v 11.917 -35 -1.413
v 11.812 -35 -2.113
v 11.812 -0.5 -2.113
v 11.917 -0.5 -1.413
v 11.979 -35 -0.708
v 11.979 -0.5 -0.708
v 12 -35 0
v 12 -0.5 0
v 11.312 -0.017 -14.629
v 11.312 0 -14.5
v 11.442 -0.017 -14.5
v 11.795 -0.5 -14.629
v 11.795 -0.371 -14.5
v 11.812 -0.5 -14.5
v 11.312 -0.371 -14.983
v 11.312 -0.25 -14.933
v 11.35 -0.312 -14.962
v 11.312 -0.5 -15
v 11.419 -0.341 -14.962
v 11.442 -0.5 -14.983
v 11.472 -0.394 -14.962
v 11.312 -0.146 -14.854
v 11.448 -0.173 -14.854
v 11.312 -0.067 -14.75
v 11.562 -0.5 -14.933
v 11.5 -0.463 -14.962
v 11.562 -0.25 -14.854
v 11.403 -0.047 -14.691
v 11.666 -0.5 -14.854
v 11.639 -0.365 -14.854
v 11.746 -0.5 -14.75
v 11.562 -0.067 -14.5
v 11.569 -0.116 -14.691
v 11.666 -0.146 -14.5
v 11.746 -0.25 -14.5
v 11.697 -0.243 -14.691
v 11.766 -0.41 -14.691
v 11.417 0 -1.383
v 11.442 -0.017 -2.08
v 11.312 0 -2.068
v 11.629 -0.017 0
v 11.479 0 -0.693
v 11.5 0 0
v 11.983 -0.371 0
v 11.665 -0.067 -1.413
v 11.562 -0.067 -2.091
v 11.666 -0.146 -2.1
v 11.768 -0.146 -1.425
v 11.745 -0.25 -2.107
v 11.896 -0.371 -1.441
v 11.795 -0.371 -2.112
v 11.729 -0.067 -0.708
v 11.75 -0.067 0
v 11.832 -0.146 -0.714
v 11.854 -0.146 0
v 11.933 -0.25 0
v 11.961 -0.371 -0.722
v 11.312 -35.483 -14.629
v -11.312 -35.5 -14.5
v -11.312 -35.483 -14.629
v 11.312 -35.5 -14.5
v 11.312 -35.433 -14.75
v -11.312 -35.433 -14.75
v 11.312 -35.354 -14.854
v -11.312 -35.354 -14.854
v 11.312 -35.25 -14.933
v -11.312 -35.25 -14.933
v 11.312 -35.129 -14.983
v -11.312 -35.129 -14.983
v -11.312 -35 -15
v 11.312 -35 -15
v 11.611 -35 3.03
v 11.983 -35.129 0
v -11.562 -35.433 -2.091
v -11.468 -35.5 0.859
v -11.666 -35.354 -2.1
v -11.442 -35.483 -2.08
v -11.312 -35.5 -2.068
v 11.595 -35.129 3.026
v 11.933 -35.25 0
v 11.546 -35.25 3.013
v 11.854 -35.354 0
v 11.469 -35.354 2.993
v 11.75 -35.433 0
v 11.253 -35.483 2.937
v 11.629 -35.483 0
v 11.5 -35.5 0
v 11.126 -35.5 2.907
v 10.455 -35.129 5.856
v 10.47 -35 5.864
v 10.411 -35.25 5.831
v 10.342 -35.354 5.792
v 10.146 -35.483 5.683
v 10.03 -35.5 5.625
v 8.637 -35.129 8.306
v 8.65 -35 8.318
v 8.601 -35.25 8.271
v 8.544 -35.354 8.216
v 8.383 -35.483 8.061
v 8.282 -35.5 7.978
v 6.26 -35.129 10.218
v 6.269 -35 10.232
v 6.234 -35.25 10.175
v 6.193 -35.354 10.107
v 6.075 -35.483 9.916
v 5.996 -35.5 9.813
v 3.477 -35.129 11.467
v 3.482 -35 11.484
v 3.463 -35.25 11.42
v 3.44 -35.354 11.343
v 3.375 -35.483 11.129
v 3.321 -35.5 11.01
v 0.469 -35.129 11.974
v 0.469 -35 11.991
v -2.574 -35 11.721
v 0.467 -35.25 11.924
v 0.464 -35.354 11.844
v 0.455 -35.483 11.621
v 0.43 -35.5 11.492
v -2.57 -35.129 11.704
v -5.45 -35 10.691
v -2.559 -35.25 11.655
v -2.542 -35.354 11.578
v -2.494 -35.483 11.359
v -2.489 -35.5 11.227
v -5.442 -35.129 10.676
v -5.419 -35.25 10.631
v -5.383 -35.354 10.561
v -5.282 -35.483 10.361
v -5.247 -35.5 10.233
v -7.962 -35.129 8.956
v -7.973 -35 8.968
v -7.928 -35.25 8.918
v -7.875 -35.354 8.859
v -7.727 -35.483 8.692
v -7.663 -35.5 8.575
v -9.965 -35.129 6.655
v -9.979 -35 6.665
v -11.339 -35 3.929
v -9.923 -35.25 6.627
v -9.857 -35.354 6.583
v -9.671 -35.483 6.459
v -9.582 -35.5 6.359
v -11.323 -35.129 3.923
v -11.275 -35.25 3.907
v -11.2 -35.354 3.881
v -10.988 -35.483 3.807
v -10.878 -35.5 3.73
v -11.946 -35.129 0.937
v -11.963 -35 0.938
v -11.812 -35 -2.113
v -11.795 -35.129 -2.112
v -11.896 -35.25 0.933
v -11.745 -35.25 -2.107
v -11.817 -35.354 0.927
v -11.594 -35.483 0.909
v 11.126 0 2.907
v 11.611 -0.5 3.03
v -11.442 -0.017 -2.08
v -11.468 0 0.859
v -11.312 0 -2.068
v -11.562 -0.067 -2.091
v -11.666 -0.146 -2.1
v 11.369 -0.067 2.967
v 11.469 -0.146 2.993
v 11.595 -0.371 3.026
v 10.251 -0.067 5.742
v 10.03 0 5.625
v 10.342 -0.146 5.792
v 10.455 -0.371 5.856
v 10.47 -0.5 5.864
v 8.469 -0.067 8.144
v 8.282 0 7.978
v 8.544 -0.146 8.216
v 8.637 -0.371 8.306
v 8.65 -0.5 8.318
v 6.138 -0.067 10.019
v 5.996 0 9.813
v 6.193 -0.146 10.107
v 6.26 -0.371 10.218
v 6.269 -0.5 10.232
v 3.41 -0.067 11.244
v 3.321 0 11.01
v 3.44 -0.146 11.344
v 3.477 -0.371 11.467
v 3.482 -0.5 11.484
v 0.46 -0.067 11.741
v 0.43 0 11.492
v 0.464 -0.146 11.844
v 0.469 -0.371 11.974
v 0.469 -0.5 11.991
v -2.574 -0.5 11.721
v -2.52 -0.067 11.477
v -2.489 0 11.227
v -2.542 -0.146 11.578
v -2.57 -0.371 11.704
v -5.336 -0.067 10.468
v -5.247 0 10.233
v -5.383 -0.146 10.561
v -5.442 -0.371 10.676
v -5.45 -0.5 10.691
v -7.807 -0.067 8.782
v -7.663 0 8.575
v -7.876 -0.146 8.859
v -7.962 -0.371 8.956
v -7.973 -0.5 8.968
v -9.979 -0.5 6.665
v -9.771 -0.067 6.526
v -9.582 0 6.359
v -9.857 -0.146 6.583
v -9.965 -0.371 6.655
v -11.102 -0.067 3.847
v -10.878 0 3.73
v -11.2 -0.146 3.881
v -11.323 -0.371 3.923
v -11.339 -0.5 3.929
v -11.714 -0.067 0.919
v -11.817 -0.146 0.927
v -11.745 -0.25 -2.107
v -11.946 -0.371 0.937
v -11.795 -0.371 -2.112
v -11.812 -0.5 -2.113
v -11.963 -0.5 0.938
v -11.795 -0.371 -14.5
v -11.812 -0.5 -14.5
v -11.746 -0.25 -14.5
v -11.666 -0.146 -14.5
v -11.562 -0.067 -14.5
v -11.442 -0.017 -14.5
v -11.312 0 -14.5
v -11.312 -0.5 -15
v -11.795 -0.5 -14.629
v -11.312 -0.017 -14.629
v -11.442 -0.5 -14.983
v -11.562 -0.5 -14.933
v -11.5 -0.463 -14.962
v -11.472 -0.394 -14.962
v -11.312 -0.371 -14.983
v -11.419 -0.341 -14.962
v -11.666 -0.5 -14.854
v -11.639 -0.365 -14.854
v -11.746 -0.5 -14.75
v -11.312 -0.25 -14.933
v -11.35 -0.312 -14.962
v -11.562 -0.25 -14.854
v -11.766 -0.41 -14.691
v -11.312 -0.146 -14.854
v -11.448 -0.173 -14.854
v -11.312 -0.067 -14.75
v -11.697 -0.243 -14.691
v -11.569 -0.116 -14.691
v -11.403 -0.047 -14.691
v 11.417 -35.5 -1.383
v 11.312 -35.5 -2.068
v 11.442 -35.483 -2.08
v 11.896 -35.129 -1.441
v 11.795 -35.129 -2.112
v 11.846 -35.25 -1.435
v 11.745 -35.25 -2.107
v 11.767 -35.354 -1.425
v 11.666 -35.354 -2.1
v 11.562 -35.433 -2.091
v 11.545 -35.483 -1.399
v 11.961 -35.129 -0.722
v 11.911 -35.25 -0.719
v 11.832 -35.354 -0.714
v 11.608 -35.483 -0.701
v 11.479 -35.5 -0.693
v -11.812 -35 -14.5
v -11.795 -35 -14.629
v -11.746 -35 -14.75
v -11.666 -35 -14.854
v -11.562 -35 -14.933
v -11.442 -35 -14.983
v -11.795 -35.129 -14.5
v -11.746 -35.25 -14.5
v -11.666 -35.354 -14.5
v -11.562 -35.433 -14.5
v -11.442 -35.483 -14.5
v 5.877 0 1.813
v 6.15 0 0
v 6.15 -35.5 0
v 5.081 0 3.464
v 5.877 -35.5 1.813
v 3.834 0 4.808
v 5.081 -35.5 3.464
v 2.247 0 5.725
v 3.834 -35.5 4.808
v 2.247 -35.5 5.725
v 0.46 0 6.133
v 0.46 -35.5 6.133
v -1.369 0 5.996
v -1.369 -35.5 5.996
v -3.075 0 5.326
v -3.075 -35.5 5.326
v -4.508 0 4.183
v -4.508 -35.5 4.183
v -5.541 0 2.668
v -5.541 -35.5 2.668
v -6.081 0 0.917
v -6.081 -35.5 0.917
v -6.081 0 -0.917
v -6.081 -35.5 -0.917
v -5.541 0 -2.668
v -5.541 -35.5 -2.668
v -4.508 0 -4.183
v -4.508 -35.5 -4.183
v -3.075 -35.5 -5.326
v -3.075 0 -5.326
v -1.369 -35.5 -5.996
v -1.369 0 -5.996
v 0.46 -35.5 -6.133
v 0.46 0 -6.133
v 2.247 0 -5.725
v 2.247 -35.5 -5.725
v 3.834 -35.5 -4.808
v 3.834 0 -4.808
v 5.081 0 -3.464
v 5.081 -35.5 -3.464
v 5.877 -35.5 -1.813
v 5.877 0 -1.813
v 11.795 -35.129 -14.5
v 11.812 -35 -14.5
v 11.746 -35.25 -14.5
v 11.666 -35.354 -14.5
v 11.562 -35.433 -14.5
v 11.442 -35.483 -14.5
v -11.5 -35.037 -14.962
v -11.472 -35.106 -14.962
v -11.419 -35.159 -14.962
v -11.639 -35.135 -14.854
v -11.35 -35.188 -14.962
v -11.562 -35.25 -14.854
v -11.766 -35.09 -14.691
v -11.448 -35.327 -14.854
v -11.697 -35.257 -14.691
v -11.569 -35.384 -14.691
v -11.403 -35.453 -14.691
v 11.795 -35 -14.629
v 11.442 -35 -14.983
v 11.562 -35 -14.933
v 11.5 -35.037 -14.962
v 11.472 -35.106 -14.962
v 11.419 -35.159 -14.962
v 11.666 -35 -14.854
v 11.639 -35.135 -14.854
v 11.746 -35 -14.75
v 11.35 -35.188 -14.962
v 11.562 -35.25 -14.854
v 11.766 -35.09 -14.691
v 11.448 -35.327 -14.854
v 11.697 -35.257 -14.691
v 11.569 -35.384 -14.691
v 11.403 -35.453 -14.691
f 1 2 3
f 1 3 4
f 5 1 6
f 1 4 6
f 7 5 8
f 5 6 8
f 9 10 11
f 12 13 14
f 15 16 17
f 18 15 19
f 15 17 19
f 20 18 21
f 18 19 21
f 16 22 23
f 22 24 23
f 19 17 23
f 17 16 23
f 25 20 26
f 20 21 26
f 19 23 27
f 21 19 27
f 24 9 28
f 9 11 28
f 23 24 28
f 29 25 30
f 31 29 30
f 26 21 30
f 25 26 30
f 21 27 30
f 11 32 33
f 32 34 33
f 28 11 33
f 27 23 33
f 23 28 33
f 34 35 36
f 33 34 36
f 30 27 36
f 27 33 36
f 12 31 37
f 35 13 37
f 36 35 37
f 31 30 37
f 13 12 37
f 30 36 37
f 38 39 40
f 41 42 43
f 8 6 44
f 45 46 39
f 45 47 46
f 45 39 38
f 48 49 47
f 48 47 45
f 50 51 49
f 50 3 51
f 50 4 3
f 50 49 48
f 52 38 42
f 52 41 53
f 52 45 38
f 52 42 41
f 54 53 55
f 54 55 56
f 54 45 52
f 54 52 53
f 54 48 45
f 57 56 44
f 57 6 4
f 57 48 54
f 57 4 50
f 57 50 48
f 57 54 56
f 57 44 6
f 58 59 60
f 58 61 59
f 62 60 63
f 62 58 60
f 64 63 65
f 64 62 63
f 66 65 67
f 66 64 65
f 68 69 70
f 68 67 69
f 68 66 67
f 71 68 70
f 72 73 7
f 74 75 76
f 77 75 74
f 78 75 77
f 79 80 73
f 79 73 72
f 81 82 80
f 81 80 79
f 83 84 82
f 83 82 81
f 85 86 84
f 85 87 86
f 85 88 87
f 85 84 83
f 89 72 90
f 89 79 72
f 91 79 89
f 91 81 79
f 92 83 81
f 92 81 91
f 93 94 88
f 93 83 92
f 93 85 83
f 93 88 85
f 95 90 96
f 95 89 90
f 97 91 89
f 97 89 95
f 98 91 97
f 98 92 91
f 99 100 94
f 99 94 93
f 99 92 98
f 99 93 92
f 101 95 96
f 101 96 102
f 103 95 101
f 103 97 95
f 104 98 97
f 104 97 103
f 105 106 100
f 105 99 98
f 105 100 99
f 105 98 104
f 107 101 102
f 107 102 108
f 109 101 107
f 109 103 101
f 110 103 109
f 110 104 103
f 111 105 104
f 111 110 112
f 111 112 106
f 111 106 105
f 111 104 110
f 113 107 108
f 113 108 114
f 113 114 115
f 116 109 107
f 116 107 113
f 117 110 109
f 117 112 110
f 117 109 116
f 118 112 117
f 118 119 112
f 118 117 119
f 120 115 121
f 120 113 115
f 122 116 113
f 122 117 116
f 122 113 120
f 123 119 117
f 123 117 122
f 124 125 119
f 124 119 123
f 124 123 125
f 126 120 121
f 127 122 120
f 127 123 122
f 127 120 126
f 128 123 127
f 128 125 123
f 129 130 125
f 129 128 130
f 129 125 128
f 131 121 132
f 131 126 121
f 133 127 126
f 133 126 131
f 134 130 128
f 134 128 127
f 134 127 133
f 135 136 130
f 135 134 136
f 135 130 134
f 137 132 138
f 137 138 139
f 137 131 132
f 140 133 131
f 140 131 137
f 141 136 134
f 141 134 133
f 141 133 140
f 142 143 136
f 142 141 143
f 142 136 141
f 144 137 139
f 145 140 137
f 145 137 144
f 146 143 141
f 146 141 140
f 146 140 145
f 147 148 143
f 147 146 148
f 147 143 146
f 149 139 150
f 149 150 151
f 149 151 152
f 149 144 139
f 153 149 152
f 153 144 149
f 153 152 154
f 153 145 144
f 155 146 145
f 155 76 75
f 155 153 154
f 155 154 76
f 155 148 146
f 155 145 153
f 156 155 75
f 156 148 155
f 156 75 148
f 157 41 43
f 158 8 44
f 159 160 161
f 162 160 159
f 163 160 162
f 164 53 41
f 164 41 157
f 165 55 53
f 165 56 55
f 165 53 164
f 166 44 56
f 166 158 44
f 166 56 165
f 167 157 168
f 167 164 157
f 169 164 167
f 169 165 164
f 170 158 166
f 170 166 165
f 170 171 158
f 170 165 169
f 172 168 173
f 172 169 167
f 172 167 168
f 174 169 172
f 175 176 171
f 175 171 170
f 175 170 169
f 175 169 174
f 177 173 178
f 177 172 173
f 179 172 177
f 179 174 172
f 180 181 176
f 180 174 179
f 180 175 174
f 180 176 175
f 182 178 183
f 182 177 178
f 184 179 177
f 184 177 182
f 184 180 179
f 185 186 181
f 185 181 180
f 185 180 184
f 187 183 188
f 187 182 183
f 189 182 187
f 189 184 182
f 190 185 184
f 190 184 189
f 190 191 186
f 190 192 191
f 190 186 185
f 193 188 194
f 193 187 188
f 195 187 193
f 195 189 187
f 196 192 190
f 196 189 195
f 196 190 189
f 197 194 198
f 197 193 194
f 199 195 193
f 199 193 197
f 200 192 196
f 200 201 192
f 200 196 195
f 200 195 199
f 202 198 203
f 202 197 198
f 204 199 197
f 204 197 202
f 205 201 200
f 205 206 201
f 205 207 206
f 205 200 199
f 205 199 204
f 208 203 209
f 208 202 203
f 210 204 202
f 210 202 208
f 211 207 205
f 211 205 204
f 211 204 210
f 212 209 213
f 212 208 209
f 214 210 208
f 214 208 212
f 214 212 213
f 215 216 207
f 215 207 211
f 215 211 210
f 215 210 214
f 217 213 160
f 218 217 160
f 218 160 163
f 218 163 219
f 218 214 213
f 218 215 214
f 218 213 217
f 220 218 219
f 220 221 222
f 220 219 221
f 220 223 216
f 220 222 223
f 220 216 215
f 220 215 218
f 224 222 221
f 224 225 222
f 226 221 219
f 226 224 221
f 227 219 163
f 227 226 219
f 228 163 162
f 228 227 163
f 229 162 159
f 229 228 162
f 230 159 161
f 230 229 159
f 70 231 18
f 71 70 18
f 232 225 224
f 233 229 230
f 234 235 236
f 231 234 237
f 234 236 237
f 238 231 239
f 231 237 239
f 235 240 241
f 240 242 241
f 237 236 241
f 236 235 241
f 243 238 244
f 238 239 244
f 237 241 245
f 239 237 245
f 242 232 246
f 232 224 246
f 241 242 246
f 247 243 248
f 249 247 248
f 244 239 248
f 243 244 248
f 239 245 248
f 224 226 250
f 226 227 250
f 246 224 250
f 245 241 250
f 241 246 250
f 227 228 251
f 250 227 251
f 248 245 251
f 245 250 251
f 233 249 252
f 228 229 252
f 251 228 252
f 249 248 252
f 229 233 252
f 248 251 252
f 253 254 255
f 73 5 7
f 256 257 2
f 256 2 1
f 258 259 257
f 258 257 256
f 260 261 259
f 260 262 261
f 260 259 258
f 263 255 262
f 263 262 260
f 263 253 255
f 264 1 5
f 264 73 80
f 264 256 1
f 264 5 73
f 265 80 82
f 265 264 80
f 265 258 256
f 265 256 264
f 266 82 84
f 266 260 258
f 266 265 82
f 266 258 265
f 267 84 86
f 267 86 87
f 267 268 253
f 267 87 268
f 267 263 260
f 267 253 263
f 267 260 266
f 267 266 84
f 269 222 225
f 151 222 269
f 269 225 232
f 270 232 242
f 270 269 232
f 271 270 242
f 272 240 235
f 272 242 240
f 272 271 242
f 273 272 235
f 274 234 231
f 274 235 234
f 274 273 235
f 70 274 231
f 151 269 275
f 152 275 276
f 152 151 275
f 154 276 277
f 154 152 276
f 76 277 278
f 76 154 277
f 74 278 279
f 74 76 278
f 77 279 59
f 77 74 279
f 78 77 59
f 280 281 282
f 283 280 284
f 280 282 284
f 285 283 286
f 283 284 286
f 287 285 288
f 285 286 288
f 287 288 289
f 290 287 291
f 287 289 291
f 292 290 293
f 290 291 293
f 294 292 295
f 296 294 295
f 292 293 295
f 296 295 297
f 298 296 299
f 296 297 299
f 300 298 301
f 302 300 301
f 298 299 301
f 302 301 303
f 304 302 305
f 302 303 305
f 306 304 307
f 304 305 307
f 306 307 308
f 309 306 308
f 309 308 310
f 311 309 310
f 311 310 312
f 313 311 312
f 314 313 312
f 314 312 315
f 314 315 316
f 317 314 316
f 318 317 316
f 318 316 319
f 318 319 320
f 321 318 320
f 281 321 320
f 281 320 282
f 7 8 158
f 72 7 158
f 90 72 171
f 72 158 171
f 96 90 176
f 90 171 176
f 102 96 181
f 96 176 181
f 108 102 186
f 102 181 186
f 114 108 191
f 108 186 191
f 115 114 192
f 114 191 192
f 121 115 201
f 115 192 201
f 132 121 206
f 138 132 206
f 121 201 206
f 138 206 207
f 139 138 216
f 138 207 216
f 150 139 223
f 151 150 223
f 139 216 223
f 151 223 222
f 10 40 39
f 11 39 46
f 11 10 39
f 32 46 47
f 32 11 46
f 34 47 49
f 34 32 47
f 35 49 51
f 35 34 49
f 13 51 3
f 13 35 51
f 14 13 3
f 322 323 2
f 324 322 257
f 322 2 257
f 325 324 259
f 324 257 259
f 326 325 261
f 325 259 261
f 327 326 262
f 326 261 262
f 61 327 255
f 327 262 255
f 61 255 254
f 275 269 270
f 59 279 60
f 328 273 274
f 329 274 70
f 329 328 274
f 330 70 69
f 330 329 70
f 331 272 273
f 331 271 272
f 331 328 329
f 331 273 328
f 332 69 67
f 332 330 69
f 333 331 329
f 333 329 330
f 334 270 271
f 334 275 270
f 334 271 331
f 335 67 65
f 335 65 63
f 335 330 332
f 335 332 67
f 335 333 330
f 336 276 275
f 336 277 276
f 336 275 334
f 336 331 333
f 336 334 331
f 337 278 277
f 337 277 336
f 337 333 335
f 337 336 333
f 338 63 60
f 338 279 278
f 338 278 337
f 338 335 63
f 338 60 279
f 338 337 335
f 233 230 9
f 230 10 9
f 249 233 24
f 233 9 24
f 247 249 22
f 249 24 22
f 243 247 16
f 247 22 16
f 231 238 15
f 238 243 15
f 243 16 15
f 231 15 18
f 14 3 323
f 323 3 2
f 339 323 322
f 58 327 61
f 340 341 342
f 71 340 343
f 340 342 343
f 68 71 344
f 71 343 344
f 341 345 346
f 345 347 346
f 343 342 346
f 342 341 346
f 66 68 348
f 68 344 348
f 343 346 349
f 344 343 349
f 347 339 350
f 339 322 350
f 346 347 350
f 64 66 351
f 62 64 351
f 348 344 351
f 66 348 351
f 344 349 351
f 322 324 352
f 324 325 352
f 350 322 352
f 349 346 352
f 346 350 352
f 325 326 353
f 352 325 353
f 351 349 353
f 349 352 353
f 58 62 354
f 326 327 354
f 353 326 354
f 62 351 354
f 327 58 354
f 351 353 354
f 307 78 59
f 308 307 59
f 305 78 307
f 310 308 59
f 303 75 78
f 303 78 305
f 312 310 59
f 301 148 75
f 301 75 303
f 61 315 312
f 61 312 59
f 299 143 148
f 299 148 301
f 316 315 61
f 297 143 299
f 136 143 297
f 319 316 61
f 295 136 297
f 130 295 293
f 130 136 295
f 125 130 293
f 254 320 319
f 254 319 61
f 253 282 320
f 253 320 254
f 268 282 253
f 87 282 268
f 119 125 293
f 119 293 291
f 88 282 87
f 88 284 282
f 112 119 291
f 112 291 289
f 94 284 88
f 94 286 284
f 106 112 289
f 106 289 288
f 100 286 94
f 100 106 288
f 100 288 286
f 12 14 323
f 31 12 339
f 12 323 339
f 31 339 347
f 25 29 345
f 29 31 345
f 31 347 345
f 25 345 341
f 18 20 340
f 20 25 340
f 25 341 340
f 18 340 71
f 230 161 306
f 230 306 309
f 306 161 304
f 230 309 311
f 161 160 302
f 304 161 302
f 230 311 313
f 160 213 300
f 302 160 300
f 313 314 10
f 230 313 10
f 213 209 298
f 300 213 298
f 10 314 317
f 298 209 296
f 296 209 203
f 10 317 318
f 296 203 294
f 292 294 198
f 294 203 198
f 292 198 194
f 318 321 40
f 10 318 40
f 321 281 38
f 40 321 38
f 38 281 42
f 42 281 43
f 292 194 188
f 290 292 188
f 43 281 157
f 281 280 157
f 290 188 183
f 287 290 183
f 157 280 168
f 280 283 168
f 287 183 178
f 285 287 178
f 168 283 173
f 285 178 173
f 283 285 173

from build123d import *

# Parameters (mm, degrees)
F1_R     = 6.15
F2_DEPTH = 35.5
F3_DEPTH = 35.501
F4_DEPTH = 2
F5_R     = 0.5


# Not quite as in the source:
# - two fillets or chamfers of one size are made in one step


with BuildPart() as f2:
    # F1 (on face) → F2 (new body)
    with BuildSketch(Plane.XZ):
        Circle(F1_R)
    extrude(amount=F2_DEPTH)


with BuildPart() as f2b:
    # F0 (on Front) → F2, piece 2 (new body)
    with BuildSketch(Plane.XZ):
        with BuildLine():
            ThreePointArc((11.8124997243, -2.1130192291), (11.9530330187, -1.0606609515), (12, 0))
            ThreePointArc((12, 0), (-1.0606609515, 11.9530330187), (-11.8124997243, -2.1130192291))
            Line((-11.8124997243, -2.1130192291), (-11.8124997243, 1))
            Line((-11.8124997243, 1), (11.8124997243, 1))
            Line((11.8124997243, 1), (11.8124997243, -2.1130192291))
        make_face()
        with BuildLine():
            Line((-11.8124997243, 1), (-11.8124997243, -2.1130192291))
            ThreePointArc((-11.8124997243, -2.1130192291), (0, -12), (11.8124997243, -2.1130192291))
            Line((11.8124997243, -2.1130192291), (11.8124997243, 1))
            Line((11.8124997243, 1), (-11.8124997243, 1))
        make_face()
        with BuildLine():
            ThreePointArc((11.8124997243, -2.1130192291), (0, -12), (-11.8124997243, -2.1130192291))
            Line((-11.8124997243, -2.1130192291), (-11.8124997243, -13))
            Line((-11.8124997243, -13), (11.8124997243, -13))
            Line((11.8124997243, -13), (11.8124997243, -2.1130192291))
        make_face()
    extrude(amount=F2_DEPTH)


with BuildPart() as f3_tool:
    # F3 (cut, through all): a face of the model
    f3_faces = [f2.part.faces().sort_by_distance(p)[0] for p in [
        (0, -35.5, 0),
    ]]
    extrude(f3_faces, amount=-F3_DEPTH)


with BuildPart() as f2_1:
    add(f2.part)

    # F3: cut by f3_tool
    add(f3_tool.part, mode=Mode.SUBTRACT)


with BuildPart() as f2b_1:
    add(f2b.part)

    # F3: cut by f3_tool
    add(f3_tool.part, mode=Mode.SUBTRACT)

    # F4 (add): a face of the model
    f4_faces = [f2b_1.faces().sort_by_distance(p)[0] for p in [
        (0, -17.75, -13),
    ]]
    extrude(f4_faces, amount=F4_DEPTH)

    # F5
    f5_edges = [f2b_1.edges().sort_by_distance(p)[0] for p in [
        (0, -35.5, 12),
        (-11.8125, -35.5, -8.55651),
        (11.8125, -35.5, -8.55651),
        (11.8125, 0, -8.55651),
        (-11.8125, 0, -8.55651),
        (0, 0, 12),
        (-11.8125, -17.75, -15),
        (0, 0, -15),
        (11.8125, -17.75, -15),
        (0, -35.5, -15),
    ]]
    fillet(f5_edges, radius=F5_R)


solid = f2b_1.part
